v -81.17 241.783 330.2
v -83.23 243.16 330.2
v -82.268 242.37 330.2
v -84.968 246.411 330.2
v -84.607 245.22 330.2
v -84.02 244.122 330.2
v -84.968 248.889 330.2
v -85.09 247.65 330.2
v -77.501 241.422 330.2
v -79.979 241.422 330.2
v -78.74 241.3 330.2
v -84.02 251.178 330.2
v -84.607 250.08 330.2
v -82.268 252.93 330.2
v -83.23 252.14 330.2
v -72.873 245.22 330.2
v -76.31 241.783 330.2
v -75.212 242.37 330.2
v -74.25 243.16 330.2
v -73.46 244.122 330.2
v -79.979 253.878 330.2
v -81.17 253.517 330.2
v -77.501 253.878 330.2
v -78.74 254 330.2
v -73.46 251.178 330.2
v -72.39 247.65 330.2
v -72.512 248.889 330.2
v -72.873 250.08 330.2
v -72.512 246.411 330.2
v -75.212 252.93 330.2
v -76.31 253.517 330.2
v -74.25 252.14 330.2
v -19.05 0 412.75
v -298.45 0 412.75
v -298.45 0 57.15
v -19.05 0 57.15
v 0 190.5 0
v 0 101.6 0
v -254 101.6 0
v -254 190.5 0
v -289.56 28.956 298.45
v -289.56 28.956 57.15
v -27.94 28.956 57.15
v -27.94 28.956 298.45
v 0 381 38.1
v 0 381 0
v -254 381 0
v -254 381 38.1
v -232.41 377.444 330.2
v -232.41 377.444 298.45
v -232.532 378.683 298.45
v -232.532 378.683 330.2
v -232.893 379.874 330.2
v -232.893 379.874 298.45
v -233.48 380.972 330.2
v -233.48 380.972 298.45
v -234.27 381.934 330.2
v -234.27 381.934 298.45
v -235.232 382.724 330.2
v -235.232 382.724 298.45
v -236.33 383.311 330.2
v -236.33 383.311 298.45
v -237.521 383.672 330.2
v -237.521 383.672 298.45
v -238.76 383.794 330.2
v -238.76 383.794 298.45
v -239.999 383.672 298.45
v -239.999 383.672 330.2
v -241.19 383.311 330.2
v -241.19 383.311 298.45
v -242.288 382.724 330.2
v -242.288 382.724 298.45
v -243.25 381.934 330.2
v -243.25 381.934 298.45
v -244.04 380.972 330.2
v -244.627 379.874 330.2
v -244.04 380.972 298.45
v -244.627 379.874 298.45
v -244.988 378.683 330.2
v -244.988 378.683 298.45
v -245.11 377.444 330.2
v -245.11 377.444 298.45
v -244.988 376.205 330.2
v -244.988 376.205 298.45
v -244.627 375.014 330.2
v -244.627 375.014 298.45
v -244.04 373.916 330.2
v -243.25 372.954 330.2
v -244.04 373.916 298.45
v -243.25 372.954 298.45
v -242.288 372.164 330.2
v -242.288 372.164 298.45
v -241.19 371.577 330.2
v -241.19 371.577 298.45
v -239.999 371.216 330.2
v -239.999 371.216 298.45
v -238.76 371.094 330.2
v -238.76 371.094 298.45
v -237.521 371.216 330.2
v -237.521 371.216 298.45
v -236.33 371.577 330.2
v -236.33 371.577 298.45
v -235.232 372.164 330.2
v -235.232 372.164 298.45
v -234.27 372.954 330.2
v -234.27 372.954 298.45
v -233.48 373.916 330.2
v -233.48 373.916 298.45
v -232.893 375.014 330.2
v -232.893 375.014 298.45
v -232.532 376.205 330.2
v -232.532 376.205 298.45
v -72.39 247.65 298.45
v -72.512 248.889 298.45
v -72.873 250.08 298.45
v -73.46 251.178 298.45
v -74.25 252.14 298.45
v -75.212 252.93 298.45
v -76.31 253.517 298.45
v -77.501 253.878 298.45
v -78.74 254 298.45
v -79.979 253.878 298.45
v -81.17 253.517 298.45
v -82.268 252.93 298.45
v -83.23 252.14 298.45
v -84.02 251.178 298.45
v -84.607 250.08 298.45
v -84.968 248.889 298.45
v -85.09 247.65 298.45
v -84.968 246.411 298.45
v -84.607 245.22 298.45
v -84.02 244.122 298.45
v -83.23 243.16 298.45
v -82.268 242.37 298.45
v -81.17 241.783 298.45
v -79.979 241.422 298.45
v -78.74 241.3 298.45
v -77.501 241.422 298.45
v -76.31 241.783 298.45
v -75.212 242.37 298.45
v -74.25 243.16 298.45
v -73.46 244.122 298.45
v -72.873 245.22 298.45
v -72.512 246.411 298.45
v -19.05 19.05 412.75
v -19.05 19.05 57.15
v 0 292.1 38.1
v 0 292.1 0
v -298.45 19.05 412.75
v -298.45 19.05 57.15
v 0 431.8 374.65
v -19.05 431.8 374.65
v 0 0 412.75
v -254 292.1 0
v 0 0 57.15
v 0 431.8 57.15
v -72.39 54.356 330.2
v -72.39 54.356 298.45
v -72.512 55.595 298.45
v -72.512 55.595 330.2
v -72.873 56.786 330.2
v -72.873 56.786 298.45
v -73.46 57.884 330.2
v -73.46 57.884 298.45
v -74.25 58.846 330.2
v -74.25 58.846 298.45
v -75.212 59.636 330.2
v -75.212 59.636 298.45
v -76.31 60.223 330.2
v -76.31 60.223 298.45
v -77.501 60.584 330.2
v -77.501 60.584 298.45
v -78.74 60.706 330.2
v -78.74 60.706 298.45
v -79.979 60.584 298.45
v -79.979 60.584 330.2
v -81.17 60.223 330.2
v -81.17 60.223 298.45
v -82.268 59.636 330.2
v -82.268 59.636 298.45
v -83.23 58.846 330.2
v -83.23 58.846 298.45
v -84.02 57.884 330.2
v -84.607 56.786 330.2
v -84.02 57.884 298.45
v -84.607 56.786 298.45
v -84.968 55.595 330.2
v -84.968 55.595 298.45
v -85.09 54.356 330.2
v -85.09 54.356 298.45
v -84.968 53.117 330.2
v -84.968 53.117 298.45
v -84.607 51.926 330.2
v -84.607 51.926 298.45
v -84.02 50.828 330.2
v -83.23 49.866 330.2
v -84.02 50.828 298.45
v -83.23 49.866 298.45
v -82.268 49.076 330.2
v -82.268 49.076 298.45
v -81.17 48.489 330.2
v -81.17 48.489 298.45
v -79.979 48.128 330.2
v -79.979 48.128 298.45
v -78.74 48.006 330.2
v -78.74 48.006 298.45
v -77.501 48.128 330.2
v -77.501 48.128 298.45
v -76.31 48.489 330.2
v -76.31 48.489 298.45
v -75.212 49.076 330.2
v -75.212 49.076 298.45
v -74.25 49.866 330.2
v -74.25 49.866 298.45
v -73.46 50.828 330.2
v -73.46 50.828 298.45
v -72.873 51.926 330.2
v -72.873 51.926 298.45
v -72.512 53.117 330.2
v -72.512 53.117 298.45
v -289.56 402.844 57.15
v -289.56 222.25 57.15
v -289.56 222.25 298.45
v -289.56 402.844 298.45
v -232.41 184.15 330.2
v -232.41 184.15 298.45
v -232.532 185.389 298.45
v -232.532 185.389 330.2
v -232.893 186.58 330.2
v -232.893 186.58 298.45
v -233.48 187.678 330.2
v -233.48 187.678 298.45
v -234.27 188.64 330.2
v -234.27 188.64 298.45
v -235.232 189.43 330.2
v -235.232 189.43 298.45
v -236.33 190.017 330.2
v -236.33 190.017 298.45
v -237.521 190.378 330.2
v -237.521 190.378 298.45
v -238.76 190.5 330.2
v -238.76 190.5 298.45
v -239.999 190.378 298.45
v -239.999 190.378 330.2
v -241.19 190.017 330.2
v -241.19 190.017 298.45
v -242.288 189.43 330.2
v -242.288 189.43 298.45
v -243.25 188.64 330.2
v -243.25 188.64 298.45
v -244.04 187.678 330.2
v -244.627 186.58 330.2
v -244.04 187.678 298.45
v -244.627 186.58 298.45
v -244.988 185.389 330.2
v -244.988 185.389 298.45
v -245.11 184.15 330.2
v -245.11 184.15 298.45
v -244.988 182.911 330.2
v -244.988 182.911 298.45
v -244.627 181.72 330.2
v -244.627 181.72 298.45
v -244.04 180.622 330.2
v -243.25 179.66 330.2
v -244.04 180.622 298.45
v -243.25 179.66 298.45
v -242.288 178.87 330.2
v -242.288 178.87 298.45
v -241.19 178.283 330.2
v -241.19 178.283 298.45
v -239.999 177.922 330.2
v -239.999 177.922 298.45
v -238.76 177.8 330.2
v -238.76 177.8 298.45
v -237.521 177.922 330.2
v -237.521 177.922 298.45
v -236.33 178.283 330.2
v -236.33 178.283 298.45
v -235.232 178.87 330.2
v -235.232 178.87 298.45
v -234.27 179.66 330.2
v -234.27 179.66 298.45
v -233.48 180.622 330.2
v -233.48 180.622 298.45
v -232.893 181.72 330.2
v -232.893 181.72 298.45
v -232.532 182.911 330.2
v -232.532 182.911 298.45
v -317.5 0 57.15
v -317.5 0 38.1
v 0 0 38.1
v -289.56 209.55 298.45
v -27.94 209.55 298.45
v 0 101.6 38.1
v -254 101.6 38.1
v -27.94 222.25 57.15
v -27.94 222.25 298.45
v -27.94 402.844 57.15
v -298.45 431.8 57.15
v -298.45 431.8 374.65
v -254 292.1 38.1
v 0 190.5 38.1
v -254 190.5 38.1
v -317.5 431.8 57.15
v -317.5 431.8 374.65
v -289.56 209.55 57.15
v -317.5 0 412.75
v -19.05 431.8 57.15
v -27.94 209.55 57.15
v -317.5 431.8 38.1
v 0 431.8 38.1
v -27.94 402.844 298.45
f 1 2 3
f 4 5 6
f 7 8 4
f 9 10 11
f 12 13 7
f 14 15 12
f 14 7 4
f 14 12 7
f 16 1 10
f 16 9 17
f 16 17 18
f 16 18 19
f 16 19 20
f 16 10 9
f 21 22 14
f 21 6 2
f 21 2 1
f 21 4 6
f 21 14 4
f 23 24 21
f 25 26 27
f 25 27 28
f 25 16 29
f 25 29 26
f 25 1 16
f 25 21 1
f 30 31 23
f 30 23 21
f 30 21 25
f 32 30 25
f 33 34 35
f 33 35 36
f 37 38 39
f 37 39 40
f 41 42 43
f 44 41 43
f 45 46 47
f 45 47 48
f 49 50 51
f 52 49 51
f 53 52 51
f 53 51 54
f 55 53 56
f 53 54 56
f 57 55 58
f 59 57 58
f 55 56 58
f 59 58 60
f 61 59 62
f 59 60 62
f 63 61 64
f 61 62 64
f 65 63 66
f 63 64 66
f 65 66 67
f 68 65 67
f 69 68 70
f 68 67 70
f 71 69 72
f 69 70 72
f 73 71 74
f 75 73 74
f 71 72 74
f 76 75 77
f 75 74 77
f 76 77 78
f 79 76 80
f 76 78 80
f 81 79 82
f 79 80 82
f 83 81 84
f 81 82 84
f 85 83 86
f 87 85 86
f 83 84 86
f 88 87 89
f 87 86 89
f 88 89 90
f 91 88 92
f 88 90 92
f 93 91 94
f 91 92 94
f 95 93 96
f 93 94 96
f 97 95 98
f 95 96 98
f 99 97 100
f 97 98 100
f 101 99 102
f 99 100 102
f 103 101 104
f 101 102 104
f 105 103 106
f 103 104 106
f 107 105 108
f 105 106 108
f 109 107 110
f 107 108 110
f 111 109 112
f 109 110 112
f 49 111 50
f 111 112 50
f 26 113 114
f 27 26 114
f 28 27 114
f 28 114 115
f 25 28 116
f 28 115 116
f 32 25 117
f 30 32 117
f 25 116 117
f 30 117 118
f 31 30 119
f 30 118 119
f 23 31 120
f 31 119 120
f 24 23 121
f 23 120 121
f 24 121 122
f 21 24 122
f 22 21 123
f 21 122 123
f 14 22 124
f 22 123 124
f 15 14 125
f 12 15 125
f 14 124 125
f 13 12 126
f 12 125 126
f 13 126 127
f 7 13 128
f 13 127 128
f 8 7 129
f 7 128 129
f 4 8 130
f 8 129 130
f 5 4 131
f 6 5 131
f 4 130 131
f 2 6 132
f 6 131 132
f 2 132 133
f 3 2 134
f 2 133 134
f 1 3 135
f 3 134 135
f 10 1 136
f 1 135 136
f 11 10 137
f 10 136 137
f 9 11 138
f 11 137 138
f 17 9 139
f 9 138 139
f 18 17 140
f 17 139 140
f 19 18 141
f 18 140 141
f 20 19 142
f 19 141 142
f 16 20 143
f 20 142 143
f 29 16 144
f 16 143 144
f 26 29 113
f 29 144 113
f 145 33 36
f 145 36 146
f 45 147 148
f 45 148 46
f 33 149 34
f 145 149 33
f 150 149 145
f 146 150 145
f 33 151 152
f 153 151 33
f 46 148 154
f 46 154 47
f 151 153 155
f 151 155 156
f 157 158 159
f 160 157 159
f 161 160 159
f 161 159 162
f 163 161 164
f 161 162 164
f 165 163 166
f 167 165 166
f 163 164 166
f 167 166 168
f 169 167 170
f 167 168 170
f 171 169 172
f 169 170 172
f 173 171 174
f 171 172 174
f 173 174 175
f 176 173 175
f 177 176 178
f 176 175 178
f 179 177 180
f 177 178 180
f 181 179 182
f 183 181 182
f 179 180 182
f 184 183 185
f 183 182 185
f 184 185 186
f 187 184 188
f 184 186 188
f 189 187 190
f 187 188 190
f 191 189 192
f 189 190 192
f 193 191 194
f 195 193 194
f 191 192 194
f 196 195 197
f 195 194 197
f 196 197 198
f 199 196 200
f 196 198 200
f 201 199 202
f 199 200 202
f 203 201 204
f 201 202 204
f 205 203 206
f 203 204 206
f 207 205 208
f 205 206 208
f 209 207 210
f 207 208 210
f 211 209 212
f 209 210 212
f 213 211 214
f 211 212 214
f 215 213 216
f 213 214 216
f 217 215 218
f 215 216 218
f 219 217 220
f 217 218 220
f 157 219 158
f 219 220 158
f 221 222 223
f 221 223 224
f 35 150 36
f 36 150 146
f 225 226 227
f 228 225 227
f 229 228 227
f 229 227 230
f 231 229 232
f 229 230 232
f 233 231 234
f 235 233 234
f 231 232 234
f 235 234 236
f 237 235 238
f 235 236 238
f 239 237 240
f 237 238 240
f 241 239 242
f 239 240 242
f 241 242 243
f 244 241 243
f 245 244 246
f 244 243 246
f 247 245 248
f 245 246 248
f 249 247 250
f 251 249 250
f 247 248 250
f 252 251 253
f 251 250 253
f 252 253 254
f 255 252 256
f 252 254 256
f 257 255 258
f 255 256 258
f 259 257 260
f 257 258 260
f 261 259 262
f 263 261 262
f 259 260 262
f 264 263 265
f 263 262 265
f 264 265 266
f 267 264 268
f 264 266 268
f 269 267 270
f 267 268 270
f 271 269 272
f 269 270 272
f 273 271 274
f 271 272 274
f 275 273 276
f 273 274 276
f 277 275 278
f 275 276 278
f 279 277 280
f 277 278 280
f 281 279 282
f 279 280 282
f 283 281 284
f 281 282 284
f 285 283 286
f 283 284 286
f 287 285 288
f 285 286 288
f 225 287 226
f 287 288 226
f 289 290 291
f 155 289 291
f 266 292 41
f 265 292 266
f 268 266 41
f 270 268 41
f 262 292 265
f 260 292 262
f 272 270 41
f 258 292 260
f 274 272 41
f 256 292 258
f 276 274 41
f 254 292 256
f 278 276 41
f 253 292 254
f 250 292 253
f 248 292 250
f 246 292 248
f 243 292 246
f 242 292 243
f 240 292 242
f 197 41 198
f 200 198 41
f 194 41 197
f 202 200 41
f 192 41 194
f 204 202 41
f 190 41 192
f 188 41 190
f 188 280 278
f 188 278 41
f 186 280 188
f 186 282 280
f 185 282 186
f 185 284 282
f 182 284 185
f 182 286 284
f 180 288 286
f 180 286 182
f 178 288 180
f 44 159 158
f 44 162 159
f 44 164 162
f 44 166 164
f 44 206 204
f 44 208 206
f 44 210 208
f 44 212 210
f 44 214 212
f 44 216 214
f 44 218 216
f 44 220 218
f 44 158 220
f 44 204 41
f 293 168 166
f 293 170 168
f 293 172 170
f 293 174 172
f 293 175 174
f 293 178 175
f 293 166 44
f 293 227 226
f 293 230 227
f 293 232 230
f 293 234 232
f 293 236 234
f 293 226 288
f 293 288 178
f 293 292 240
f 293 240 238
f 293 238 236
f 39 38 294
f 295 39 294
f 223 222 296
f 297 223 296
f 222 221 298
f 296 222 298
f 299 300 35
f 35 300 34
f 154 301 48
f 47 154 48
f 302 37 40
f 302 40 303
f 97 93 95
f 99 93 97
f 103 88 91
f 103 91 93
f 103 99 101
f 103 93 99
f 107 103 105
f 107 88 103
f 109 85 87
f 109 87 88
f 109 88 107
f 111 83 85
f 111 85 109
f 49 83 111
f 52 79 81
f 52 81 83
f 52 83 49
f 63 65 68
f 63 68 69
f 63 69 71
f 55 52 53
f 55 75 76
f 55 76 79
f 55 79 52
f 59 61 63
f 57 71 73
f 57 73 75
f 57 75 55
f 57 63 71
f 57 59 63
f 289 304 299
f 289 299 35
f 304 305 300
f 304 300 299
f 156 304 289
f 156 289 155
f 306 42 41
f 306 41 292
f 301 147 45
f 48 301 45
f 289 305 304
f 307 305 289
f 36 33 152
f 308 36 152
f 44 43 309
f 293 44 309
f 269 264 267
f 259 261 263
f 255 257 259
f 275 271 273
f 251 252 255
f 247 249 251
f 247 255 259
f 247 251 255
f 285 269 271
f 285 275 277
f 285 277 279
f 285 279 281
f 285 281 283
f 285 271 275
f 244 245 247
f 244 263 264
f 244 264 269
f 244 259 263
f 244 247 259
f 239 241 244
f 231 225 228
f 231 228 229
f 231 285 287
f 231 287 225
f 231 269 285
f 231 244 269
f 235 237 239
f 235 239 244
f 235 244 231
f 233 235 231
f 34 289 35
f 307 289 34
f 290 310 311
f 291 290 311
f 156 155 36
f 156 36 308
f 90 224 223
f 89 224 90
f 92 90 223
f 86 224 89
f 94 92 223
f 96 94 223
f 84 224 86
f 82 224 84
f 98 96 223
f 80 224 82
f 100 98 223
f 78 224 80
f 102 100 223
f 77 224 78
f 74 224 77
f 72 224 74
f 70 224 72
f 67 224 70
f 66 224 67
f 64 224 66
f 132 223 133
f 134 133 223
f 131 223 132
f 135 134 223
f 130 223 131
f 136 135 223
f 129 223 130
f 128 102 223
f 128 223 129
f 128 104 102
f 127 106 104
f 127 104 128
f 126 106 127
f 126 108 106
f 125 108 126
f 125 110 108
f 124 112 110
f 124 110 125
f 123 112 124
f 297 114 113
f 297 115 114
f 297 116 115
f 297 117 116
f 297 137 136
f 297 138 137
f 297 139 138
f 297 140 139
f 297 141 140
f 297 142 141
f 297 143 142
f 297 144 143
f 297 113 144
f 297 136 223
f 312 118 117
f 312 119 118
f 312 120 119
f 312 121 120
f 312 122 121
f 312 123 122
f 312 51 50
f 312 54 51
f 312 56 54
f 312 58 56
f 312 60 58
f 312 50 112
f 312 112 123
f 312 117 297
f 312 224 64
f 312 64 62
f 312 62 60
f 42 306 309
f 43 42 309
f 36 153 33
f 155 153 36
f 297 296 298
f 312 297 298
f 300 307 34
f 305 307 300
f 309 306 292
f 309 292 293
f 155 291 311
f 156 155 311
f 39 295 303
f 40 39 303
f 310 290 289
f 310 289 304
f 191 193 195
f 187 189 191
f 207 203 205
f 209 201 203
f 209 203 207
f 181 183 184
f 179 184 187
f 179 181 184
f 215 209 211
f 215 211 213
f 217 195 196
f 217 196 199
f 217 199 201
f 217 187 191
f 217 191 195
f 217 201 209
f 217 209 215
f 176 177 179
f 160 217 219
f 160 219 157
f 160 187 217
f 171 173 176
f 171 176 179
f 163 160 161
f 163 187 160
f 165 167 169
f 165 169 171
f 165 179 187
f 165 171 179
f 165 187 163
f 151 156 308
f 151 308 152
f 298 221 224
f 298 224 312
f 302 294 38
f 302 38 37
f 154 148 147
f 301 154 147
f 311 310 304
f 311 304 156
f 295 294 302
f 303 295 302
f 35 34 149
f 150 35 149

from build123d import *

# Parameters (mm, degrees)
F2_W      = 88.9
F2_H      = 38.1
F3_DEPTH  = 254
F4_W      = 317.5
F4_H      = 431.8
F5_DEPTH  = 19.05
F7_DEPTH  = 19.05
F9_DEPTH  = 19.05
F10_W     = 261.62
F10_H     = 180.594
F11_DEPTH = 241.3
F12_R     = 6.35
F13_DEPTH = 31.75
F14_W     = 279.4
F14_H     = 19.05
F15_DEPTH = 355.6


with BuildPart() as f3:
    # F2 (on face) → F3 (new body)
    with BuildSketch(Plane.YZ):
        with Locations((146.05, 19.05)):
            Rectangle(F2_W, F2_H)
    extrude(amount=-F3_DEPTH)


with BuildPart() as f3b:
    # F2 (on face) → F3, piece 2 (new body)
    with BuildSketch(Plane.YZ):
        with Locations((336.55, 19.05)):
            Rectangle(F2_W, F2_H)
    extrude(amount=-F3_DEPTH)


with BuildPart() as f5:
    # F4 (on face) → F5 (new body)
    with BuildSketch(Plane.XY.offset(38.1)):
        with Locations((-158.75, 215.9)):
            Rectangle(F4_W, F4_H)
    extrude(amount=F5_DEPTH)


with BuildPart() as f7:
    # F6 (on face) → F7 (new body)
    with BuildSketch(Plane(origin=(-317.5, 0, 0), x_dir=(0, -1, 0), z_dir=(-1, 0, 0))):
        Polygon((-431.8, 374.65), (-431.8, 57.15), (0, 57.15), (0, 412.75), align=None)
    extrude(amount=-F7_DEPTH)


with BuildPart() as f9:
    # F8 (on face) → F9 (new body)
    with BuildSketch(Plane.YZ):
        Polygon((431.8, 57.15), (431.8, 374.65), (0, 412.75), (0, 57.15), align=None)
    extrude(amount=-F9_DEPTH)


with BuildPart() as f11:
    # F10 (on face) → F11 (new body)
    with BuildSketch(Plane.XY.offset(57.15)):
        with Locations((-158.75, 312.547)):
            Rectangle(F10_W, F10_H)
    extrude(amount=F11_DEPTH)

    # F12 (on face) → F13 (join)
    with BuildSketch(Plane.XY.offset(298.45)):
        with Locations((-238.76, 377.444)):
            Circle(F12_R)
        with Locations((-78.74, 247.65)):
            Circle(F12_R)
    extrude(amount=F13_DEPTH)


with BuildPart() as f11b:
    # F10 (on face) → F11, piece 2 (new body)
    with BuildSketch(Plane.XY.offset(57.15)):
        with Locations((-158.75, 119.253)):
            Rectangle(F10_W, F10_H)
    extrude(amount=F11_DEPTH)

    # F12 (on face) → F13, piece 2 (join)
    with BuildSketch(Plane.XY.offset(298.45)):
        with Locations((-238.76, 184.15)):
            Circle(F12_R)
        with Locations((-78.74, 54.356)):
            Circle(F12_R)
    extrude(amount=F13_DEPTH)


with BuildPart() as f15:
    # F14 (on face) → F15 (new body, through all)
    with BuildSketch(Plane.XY.offset(57.15)):
        with Locations((-158.75, 9.525)):
            Rectangle(F14_W, F14_H)
    extrude(amount=F15_DEPTH)


solid = Compound([f3.part, f3b.part, f5.part, f7.part, f9.part, f11.part, f11b.part, f15.part])
